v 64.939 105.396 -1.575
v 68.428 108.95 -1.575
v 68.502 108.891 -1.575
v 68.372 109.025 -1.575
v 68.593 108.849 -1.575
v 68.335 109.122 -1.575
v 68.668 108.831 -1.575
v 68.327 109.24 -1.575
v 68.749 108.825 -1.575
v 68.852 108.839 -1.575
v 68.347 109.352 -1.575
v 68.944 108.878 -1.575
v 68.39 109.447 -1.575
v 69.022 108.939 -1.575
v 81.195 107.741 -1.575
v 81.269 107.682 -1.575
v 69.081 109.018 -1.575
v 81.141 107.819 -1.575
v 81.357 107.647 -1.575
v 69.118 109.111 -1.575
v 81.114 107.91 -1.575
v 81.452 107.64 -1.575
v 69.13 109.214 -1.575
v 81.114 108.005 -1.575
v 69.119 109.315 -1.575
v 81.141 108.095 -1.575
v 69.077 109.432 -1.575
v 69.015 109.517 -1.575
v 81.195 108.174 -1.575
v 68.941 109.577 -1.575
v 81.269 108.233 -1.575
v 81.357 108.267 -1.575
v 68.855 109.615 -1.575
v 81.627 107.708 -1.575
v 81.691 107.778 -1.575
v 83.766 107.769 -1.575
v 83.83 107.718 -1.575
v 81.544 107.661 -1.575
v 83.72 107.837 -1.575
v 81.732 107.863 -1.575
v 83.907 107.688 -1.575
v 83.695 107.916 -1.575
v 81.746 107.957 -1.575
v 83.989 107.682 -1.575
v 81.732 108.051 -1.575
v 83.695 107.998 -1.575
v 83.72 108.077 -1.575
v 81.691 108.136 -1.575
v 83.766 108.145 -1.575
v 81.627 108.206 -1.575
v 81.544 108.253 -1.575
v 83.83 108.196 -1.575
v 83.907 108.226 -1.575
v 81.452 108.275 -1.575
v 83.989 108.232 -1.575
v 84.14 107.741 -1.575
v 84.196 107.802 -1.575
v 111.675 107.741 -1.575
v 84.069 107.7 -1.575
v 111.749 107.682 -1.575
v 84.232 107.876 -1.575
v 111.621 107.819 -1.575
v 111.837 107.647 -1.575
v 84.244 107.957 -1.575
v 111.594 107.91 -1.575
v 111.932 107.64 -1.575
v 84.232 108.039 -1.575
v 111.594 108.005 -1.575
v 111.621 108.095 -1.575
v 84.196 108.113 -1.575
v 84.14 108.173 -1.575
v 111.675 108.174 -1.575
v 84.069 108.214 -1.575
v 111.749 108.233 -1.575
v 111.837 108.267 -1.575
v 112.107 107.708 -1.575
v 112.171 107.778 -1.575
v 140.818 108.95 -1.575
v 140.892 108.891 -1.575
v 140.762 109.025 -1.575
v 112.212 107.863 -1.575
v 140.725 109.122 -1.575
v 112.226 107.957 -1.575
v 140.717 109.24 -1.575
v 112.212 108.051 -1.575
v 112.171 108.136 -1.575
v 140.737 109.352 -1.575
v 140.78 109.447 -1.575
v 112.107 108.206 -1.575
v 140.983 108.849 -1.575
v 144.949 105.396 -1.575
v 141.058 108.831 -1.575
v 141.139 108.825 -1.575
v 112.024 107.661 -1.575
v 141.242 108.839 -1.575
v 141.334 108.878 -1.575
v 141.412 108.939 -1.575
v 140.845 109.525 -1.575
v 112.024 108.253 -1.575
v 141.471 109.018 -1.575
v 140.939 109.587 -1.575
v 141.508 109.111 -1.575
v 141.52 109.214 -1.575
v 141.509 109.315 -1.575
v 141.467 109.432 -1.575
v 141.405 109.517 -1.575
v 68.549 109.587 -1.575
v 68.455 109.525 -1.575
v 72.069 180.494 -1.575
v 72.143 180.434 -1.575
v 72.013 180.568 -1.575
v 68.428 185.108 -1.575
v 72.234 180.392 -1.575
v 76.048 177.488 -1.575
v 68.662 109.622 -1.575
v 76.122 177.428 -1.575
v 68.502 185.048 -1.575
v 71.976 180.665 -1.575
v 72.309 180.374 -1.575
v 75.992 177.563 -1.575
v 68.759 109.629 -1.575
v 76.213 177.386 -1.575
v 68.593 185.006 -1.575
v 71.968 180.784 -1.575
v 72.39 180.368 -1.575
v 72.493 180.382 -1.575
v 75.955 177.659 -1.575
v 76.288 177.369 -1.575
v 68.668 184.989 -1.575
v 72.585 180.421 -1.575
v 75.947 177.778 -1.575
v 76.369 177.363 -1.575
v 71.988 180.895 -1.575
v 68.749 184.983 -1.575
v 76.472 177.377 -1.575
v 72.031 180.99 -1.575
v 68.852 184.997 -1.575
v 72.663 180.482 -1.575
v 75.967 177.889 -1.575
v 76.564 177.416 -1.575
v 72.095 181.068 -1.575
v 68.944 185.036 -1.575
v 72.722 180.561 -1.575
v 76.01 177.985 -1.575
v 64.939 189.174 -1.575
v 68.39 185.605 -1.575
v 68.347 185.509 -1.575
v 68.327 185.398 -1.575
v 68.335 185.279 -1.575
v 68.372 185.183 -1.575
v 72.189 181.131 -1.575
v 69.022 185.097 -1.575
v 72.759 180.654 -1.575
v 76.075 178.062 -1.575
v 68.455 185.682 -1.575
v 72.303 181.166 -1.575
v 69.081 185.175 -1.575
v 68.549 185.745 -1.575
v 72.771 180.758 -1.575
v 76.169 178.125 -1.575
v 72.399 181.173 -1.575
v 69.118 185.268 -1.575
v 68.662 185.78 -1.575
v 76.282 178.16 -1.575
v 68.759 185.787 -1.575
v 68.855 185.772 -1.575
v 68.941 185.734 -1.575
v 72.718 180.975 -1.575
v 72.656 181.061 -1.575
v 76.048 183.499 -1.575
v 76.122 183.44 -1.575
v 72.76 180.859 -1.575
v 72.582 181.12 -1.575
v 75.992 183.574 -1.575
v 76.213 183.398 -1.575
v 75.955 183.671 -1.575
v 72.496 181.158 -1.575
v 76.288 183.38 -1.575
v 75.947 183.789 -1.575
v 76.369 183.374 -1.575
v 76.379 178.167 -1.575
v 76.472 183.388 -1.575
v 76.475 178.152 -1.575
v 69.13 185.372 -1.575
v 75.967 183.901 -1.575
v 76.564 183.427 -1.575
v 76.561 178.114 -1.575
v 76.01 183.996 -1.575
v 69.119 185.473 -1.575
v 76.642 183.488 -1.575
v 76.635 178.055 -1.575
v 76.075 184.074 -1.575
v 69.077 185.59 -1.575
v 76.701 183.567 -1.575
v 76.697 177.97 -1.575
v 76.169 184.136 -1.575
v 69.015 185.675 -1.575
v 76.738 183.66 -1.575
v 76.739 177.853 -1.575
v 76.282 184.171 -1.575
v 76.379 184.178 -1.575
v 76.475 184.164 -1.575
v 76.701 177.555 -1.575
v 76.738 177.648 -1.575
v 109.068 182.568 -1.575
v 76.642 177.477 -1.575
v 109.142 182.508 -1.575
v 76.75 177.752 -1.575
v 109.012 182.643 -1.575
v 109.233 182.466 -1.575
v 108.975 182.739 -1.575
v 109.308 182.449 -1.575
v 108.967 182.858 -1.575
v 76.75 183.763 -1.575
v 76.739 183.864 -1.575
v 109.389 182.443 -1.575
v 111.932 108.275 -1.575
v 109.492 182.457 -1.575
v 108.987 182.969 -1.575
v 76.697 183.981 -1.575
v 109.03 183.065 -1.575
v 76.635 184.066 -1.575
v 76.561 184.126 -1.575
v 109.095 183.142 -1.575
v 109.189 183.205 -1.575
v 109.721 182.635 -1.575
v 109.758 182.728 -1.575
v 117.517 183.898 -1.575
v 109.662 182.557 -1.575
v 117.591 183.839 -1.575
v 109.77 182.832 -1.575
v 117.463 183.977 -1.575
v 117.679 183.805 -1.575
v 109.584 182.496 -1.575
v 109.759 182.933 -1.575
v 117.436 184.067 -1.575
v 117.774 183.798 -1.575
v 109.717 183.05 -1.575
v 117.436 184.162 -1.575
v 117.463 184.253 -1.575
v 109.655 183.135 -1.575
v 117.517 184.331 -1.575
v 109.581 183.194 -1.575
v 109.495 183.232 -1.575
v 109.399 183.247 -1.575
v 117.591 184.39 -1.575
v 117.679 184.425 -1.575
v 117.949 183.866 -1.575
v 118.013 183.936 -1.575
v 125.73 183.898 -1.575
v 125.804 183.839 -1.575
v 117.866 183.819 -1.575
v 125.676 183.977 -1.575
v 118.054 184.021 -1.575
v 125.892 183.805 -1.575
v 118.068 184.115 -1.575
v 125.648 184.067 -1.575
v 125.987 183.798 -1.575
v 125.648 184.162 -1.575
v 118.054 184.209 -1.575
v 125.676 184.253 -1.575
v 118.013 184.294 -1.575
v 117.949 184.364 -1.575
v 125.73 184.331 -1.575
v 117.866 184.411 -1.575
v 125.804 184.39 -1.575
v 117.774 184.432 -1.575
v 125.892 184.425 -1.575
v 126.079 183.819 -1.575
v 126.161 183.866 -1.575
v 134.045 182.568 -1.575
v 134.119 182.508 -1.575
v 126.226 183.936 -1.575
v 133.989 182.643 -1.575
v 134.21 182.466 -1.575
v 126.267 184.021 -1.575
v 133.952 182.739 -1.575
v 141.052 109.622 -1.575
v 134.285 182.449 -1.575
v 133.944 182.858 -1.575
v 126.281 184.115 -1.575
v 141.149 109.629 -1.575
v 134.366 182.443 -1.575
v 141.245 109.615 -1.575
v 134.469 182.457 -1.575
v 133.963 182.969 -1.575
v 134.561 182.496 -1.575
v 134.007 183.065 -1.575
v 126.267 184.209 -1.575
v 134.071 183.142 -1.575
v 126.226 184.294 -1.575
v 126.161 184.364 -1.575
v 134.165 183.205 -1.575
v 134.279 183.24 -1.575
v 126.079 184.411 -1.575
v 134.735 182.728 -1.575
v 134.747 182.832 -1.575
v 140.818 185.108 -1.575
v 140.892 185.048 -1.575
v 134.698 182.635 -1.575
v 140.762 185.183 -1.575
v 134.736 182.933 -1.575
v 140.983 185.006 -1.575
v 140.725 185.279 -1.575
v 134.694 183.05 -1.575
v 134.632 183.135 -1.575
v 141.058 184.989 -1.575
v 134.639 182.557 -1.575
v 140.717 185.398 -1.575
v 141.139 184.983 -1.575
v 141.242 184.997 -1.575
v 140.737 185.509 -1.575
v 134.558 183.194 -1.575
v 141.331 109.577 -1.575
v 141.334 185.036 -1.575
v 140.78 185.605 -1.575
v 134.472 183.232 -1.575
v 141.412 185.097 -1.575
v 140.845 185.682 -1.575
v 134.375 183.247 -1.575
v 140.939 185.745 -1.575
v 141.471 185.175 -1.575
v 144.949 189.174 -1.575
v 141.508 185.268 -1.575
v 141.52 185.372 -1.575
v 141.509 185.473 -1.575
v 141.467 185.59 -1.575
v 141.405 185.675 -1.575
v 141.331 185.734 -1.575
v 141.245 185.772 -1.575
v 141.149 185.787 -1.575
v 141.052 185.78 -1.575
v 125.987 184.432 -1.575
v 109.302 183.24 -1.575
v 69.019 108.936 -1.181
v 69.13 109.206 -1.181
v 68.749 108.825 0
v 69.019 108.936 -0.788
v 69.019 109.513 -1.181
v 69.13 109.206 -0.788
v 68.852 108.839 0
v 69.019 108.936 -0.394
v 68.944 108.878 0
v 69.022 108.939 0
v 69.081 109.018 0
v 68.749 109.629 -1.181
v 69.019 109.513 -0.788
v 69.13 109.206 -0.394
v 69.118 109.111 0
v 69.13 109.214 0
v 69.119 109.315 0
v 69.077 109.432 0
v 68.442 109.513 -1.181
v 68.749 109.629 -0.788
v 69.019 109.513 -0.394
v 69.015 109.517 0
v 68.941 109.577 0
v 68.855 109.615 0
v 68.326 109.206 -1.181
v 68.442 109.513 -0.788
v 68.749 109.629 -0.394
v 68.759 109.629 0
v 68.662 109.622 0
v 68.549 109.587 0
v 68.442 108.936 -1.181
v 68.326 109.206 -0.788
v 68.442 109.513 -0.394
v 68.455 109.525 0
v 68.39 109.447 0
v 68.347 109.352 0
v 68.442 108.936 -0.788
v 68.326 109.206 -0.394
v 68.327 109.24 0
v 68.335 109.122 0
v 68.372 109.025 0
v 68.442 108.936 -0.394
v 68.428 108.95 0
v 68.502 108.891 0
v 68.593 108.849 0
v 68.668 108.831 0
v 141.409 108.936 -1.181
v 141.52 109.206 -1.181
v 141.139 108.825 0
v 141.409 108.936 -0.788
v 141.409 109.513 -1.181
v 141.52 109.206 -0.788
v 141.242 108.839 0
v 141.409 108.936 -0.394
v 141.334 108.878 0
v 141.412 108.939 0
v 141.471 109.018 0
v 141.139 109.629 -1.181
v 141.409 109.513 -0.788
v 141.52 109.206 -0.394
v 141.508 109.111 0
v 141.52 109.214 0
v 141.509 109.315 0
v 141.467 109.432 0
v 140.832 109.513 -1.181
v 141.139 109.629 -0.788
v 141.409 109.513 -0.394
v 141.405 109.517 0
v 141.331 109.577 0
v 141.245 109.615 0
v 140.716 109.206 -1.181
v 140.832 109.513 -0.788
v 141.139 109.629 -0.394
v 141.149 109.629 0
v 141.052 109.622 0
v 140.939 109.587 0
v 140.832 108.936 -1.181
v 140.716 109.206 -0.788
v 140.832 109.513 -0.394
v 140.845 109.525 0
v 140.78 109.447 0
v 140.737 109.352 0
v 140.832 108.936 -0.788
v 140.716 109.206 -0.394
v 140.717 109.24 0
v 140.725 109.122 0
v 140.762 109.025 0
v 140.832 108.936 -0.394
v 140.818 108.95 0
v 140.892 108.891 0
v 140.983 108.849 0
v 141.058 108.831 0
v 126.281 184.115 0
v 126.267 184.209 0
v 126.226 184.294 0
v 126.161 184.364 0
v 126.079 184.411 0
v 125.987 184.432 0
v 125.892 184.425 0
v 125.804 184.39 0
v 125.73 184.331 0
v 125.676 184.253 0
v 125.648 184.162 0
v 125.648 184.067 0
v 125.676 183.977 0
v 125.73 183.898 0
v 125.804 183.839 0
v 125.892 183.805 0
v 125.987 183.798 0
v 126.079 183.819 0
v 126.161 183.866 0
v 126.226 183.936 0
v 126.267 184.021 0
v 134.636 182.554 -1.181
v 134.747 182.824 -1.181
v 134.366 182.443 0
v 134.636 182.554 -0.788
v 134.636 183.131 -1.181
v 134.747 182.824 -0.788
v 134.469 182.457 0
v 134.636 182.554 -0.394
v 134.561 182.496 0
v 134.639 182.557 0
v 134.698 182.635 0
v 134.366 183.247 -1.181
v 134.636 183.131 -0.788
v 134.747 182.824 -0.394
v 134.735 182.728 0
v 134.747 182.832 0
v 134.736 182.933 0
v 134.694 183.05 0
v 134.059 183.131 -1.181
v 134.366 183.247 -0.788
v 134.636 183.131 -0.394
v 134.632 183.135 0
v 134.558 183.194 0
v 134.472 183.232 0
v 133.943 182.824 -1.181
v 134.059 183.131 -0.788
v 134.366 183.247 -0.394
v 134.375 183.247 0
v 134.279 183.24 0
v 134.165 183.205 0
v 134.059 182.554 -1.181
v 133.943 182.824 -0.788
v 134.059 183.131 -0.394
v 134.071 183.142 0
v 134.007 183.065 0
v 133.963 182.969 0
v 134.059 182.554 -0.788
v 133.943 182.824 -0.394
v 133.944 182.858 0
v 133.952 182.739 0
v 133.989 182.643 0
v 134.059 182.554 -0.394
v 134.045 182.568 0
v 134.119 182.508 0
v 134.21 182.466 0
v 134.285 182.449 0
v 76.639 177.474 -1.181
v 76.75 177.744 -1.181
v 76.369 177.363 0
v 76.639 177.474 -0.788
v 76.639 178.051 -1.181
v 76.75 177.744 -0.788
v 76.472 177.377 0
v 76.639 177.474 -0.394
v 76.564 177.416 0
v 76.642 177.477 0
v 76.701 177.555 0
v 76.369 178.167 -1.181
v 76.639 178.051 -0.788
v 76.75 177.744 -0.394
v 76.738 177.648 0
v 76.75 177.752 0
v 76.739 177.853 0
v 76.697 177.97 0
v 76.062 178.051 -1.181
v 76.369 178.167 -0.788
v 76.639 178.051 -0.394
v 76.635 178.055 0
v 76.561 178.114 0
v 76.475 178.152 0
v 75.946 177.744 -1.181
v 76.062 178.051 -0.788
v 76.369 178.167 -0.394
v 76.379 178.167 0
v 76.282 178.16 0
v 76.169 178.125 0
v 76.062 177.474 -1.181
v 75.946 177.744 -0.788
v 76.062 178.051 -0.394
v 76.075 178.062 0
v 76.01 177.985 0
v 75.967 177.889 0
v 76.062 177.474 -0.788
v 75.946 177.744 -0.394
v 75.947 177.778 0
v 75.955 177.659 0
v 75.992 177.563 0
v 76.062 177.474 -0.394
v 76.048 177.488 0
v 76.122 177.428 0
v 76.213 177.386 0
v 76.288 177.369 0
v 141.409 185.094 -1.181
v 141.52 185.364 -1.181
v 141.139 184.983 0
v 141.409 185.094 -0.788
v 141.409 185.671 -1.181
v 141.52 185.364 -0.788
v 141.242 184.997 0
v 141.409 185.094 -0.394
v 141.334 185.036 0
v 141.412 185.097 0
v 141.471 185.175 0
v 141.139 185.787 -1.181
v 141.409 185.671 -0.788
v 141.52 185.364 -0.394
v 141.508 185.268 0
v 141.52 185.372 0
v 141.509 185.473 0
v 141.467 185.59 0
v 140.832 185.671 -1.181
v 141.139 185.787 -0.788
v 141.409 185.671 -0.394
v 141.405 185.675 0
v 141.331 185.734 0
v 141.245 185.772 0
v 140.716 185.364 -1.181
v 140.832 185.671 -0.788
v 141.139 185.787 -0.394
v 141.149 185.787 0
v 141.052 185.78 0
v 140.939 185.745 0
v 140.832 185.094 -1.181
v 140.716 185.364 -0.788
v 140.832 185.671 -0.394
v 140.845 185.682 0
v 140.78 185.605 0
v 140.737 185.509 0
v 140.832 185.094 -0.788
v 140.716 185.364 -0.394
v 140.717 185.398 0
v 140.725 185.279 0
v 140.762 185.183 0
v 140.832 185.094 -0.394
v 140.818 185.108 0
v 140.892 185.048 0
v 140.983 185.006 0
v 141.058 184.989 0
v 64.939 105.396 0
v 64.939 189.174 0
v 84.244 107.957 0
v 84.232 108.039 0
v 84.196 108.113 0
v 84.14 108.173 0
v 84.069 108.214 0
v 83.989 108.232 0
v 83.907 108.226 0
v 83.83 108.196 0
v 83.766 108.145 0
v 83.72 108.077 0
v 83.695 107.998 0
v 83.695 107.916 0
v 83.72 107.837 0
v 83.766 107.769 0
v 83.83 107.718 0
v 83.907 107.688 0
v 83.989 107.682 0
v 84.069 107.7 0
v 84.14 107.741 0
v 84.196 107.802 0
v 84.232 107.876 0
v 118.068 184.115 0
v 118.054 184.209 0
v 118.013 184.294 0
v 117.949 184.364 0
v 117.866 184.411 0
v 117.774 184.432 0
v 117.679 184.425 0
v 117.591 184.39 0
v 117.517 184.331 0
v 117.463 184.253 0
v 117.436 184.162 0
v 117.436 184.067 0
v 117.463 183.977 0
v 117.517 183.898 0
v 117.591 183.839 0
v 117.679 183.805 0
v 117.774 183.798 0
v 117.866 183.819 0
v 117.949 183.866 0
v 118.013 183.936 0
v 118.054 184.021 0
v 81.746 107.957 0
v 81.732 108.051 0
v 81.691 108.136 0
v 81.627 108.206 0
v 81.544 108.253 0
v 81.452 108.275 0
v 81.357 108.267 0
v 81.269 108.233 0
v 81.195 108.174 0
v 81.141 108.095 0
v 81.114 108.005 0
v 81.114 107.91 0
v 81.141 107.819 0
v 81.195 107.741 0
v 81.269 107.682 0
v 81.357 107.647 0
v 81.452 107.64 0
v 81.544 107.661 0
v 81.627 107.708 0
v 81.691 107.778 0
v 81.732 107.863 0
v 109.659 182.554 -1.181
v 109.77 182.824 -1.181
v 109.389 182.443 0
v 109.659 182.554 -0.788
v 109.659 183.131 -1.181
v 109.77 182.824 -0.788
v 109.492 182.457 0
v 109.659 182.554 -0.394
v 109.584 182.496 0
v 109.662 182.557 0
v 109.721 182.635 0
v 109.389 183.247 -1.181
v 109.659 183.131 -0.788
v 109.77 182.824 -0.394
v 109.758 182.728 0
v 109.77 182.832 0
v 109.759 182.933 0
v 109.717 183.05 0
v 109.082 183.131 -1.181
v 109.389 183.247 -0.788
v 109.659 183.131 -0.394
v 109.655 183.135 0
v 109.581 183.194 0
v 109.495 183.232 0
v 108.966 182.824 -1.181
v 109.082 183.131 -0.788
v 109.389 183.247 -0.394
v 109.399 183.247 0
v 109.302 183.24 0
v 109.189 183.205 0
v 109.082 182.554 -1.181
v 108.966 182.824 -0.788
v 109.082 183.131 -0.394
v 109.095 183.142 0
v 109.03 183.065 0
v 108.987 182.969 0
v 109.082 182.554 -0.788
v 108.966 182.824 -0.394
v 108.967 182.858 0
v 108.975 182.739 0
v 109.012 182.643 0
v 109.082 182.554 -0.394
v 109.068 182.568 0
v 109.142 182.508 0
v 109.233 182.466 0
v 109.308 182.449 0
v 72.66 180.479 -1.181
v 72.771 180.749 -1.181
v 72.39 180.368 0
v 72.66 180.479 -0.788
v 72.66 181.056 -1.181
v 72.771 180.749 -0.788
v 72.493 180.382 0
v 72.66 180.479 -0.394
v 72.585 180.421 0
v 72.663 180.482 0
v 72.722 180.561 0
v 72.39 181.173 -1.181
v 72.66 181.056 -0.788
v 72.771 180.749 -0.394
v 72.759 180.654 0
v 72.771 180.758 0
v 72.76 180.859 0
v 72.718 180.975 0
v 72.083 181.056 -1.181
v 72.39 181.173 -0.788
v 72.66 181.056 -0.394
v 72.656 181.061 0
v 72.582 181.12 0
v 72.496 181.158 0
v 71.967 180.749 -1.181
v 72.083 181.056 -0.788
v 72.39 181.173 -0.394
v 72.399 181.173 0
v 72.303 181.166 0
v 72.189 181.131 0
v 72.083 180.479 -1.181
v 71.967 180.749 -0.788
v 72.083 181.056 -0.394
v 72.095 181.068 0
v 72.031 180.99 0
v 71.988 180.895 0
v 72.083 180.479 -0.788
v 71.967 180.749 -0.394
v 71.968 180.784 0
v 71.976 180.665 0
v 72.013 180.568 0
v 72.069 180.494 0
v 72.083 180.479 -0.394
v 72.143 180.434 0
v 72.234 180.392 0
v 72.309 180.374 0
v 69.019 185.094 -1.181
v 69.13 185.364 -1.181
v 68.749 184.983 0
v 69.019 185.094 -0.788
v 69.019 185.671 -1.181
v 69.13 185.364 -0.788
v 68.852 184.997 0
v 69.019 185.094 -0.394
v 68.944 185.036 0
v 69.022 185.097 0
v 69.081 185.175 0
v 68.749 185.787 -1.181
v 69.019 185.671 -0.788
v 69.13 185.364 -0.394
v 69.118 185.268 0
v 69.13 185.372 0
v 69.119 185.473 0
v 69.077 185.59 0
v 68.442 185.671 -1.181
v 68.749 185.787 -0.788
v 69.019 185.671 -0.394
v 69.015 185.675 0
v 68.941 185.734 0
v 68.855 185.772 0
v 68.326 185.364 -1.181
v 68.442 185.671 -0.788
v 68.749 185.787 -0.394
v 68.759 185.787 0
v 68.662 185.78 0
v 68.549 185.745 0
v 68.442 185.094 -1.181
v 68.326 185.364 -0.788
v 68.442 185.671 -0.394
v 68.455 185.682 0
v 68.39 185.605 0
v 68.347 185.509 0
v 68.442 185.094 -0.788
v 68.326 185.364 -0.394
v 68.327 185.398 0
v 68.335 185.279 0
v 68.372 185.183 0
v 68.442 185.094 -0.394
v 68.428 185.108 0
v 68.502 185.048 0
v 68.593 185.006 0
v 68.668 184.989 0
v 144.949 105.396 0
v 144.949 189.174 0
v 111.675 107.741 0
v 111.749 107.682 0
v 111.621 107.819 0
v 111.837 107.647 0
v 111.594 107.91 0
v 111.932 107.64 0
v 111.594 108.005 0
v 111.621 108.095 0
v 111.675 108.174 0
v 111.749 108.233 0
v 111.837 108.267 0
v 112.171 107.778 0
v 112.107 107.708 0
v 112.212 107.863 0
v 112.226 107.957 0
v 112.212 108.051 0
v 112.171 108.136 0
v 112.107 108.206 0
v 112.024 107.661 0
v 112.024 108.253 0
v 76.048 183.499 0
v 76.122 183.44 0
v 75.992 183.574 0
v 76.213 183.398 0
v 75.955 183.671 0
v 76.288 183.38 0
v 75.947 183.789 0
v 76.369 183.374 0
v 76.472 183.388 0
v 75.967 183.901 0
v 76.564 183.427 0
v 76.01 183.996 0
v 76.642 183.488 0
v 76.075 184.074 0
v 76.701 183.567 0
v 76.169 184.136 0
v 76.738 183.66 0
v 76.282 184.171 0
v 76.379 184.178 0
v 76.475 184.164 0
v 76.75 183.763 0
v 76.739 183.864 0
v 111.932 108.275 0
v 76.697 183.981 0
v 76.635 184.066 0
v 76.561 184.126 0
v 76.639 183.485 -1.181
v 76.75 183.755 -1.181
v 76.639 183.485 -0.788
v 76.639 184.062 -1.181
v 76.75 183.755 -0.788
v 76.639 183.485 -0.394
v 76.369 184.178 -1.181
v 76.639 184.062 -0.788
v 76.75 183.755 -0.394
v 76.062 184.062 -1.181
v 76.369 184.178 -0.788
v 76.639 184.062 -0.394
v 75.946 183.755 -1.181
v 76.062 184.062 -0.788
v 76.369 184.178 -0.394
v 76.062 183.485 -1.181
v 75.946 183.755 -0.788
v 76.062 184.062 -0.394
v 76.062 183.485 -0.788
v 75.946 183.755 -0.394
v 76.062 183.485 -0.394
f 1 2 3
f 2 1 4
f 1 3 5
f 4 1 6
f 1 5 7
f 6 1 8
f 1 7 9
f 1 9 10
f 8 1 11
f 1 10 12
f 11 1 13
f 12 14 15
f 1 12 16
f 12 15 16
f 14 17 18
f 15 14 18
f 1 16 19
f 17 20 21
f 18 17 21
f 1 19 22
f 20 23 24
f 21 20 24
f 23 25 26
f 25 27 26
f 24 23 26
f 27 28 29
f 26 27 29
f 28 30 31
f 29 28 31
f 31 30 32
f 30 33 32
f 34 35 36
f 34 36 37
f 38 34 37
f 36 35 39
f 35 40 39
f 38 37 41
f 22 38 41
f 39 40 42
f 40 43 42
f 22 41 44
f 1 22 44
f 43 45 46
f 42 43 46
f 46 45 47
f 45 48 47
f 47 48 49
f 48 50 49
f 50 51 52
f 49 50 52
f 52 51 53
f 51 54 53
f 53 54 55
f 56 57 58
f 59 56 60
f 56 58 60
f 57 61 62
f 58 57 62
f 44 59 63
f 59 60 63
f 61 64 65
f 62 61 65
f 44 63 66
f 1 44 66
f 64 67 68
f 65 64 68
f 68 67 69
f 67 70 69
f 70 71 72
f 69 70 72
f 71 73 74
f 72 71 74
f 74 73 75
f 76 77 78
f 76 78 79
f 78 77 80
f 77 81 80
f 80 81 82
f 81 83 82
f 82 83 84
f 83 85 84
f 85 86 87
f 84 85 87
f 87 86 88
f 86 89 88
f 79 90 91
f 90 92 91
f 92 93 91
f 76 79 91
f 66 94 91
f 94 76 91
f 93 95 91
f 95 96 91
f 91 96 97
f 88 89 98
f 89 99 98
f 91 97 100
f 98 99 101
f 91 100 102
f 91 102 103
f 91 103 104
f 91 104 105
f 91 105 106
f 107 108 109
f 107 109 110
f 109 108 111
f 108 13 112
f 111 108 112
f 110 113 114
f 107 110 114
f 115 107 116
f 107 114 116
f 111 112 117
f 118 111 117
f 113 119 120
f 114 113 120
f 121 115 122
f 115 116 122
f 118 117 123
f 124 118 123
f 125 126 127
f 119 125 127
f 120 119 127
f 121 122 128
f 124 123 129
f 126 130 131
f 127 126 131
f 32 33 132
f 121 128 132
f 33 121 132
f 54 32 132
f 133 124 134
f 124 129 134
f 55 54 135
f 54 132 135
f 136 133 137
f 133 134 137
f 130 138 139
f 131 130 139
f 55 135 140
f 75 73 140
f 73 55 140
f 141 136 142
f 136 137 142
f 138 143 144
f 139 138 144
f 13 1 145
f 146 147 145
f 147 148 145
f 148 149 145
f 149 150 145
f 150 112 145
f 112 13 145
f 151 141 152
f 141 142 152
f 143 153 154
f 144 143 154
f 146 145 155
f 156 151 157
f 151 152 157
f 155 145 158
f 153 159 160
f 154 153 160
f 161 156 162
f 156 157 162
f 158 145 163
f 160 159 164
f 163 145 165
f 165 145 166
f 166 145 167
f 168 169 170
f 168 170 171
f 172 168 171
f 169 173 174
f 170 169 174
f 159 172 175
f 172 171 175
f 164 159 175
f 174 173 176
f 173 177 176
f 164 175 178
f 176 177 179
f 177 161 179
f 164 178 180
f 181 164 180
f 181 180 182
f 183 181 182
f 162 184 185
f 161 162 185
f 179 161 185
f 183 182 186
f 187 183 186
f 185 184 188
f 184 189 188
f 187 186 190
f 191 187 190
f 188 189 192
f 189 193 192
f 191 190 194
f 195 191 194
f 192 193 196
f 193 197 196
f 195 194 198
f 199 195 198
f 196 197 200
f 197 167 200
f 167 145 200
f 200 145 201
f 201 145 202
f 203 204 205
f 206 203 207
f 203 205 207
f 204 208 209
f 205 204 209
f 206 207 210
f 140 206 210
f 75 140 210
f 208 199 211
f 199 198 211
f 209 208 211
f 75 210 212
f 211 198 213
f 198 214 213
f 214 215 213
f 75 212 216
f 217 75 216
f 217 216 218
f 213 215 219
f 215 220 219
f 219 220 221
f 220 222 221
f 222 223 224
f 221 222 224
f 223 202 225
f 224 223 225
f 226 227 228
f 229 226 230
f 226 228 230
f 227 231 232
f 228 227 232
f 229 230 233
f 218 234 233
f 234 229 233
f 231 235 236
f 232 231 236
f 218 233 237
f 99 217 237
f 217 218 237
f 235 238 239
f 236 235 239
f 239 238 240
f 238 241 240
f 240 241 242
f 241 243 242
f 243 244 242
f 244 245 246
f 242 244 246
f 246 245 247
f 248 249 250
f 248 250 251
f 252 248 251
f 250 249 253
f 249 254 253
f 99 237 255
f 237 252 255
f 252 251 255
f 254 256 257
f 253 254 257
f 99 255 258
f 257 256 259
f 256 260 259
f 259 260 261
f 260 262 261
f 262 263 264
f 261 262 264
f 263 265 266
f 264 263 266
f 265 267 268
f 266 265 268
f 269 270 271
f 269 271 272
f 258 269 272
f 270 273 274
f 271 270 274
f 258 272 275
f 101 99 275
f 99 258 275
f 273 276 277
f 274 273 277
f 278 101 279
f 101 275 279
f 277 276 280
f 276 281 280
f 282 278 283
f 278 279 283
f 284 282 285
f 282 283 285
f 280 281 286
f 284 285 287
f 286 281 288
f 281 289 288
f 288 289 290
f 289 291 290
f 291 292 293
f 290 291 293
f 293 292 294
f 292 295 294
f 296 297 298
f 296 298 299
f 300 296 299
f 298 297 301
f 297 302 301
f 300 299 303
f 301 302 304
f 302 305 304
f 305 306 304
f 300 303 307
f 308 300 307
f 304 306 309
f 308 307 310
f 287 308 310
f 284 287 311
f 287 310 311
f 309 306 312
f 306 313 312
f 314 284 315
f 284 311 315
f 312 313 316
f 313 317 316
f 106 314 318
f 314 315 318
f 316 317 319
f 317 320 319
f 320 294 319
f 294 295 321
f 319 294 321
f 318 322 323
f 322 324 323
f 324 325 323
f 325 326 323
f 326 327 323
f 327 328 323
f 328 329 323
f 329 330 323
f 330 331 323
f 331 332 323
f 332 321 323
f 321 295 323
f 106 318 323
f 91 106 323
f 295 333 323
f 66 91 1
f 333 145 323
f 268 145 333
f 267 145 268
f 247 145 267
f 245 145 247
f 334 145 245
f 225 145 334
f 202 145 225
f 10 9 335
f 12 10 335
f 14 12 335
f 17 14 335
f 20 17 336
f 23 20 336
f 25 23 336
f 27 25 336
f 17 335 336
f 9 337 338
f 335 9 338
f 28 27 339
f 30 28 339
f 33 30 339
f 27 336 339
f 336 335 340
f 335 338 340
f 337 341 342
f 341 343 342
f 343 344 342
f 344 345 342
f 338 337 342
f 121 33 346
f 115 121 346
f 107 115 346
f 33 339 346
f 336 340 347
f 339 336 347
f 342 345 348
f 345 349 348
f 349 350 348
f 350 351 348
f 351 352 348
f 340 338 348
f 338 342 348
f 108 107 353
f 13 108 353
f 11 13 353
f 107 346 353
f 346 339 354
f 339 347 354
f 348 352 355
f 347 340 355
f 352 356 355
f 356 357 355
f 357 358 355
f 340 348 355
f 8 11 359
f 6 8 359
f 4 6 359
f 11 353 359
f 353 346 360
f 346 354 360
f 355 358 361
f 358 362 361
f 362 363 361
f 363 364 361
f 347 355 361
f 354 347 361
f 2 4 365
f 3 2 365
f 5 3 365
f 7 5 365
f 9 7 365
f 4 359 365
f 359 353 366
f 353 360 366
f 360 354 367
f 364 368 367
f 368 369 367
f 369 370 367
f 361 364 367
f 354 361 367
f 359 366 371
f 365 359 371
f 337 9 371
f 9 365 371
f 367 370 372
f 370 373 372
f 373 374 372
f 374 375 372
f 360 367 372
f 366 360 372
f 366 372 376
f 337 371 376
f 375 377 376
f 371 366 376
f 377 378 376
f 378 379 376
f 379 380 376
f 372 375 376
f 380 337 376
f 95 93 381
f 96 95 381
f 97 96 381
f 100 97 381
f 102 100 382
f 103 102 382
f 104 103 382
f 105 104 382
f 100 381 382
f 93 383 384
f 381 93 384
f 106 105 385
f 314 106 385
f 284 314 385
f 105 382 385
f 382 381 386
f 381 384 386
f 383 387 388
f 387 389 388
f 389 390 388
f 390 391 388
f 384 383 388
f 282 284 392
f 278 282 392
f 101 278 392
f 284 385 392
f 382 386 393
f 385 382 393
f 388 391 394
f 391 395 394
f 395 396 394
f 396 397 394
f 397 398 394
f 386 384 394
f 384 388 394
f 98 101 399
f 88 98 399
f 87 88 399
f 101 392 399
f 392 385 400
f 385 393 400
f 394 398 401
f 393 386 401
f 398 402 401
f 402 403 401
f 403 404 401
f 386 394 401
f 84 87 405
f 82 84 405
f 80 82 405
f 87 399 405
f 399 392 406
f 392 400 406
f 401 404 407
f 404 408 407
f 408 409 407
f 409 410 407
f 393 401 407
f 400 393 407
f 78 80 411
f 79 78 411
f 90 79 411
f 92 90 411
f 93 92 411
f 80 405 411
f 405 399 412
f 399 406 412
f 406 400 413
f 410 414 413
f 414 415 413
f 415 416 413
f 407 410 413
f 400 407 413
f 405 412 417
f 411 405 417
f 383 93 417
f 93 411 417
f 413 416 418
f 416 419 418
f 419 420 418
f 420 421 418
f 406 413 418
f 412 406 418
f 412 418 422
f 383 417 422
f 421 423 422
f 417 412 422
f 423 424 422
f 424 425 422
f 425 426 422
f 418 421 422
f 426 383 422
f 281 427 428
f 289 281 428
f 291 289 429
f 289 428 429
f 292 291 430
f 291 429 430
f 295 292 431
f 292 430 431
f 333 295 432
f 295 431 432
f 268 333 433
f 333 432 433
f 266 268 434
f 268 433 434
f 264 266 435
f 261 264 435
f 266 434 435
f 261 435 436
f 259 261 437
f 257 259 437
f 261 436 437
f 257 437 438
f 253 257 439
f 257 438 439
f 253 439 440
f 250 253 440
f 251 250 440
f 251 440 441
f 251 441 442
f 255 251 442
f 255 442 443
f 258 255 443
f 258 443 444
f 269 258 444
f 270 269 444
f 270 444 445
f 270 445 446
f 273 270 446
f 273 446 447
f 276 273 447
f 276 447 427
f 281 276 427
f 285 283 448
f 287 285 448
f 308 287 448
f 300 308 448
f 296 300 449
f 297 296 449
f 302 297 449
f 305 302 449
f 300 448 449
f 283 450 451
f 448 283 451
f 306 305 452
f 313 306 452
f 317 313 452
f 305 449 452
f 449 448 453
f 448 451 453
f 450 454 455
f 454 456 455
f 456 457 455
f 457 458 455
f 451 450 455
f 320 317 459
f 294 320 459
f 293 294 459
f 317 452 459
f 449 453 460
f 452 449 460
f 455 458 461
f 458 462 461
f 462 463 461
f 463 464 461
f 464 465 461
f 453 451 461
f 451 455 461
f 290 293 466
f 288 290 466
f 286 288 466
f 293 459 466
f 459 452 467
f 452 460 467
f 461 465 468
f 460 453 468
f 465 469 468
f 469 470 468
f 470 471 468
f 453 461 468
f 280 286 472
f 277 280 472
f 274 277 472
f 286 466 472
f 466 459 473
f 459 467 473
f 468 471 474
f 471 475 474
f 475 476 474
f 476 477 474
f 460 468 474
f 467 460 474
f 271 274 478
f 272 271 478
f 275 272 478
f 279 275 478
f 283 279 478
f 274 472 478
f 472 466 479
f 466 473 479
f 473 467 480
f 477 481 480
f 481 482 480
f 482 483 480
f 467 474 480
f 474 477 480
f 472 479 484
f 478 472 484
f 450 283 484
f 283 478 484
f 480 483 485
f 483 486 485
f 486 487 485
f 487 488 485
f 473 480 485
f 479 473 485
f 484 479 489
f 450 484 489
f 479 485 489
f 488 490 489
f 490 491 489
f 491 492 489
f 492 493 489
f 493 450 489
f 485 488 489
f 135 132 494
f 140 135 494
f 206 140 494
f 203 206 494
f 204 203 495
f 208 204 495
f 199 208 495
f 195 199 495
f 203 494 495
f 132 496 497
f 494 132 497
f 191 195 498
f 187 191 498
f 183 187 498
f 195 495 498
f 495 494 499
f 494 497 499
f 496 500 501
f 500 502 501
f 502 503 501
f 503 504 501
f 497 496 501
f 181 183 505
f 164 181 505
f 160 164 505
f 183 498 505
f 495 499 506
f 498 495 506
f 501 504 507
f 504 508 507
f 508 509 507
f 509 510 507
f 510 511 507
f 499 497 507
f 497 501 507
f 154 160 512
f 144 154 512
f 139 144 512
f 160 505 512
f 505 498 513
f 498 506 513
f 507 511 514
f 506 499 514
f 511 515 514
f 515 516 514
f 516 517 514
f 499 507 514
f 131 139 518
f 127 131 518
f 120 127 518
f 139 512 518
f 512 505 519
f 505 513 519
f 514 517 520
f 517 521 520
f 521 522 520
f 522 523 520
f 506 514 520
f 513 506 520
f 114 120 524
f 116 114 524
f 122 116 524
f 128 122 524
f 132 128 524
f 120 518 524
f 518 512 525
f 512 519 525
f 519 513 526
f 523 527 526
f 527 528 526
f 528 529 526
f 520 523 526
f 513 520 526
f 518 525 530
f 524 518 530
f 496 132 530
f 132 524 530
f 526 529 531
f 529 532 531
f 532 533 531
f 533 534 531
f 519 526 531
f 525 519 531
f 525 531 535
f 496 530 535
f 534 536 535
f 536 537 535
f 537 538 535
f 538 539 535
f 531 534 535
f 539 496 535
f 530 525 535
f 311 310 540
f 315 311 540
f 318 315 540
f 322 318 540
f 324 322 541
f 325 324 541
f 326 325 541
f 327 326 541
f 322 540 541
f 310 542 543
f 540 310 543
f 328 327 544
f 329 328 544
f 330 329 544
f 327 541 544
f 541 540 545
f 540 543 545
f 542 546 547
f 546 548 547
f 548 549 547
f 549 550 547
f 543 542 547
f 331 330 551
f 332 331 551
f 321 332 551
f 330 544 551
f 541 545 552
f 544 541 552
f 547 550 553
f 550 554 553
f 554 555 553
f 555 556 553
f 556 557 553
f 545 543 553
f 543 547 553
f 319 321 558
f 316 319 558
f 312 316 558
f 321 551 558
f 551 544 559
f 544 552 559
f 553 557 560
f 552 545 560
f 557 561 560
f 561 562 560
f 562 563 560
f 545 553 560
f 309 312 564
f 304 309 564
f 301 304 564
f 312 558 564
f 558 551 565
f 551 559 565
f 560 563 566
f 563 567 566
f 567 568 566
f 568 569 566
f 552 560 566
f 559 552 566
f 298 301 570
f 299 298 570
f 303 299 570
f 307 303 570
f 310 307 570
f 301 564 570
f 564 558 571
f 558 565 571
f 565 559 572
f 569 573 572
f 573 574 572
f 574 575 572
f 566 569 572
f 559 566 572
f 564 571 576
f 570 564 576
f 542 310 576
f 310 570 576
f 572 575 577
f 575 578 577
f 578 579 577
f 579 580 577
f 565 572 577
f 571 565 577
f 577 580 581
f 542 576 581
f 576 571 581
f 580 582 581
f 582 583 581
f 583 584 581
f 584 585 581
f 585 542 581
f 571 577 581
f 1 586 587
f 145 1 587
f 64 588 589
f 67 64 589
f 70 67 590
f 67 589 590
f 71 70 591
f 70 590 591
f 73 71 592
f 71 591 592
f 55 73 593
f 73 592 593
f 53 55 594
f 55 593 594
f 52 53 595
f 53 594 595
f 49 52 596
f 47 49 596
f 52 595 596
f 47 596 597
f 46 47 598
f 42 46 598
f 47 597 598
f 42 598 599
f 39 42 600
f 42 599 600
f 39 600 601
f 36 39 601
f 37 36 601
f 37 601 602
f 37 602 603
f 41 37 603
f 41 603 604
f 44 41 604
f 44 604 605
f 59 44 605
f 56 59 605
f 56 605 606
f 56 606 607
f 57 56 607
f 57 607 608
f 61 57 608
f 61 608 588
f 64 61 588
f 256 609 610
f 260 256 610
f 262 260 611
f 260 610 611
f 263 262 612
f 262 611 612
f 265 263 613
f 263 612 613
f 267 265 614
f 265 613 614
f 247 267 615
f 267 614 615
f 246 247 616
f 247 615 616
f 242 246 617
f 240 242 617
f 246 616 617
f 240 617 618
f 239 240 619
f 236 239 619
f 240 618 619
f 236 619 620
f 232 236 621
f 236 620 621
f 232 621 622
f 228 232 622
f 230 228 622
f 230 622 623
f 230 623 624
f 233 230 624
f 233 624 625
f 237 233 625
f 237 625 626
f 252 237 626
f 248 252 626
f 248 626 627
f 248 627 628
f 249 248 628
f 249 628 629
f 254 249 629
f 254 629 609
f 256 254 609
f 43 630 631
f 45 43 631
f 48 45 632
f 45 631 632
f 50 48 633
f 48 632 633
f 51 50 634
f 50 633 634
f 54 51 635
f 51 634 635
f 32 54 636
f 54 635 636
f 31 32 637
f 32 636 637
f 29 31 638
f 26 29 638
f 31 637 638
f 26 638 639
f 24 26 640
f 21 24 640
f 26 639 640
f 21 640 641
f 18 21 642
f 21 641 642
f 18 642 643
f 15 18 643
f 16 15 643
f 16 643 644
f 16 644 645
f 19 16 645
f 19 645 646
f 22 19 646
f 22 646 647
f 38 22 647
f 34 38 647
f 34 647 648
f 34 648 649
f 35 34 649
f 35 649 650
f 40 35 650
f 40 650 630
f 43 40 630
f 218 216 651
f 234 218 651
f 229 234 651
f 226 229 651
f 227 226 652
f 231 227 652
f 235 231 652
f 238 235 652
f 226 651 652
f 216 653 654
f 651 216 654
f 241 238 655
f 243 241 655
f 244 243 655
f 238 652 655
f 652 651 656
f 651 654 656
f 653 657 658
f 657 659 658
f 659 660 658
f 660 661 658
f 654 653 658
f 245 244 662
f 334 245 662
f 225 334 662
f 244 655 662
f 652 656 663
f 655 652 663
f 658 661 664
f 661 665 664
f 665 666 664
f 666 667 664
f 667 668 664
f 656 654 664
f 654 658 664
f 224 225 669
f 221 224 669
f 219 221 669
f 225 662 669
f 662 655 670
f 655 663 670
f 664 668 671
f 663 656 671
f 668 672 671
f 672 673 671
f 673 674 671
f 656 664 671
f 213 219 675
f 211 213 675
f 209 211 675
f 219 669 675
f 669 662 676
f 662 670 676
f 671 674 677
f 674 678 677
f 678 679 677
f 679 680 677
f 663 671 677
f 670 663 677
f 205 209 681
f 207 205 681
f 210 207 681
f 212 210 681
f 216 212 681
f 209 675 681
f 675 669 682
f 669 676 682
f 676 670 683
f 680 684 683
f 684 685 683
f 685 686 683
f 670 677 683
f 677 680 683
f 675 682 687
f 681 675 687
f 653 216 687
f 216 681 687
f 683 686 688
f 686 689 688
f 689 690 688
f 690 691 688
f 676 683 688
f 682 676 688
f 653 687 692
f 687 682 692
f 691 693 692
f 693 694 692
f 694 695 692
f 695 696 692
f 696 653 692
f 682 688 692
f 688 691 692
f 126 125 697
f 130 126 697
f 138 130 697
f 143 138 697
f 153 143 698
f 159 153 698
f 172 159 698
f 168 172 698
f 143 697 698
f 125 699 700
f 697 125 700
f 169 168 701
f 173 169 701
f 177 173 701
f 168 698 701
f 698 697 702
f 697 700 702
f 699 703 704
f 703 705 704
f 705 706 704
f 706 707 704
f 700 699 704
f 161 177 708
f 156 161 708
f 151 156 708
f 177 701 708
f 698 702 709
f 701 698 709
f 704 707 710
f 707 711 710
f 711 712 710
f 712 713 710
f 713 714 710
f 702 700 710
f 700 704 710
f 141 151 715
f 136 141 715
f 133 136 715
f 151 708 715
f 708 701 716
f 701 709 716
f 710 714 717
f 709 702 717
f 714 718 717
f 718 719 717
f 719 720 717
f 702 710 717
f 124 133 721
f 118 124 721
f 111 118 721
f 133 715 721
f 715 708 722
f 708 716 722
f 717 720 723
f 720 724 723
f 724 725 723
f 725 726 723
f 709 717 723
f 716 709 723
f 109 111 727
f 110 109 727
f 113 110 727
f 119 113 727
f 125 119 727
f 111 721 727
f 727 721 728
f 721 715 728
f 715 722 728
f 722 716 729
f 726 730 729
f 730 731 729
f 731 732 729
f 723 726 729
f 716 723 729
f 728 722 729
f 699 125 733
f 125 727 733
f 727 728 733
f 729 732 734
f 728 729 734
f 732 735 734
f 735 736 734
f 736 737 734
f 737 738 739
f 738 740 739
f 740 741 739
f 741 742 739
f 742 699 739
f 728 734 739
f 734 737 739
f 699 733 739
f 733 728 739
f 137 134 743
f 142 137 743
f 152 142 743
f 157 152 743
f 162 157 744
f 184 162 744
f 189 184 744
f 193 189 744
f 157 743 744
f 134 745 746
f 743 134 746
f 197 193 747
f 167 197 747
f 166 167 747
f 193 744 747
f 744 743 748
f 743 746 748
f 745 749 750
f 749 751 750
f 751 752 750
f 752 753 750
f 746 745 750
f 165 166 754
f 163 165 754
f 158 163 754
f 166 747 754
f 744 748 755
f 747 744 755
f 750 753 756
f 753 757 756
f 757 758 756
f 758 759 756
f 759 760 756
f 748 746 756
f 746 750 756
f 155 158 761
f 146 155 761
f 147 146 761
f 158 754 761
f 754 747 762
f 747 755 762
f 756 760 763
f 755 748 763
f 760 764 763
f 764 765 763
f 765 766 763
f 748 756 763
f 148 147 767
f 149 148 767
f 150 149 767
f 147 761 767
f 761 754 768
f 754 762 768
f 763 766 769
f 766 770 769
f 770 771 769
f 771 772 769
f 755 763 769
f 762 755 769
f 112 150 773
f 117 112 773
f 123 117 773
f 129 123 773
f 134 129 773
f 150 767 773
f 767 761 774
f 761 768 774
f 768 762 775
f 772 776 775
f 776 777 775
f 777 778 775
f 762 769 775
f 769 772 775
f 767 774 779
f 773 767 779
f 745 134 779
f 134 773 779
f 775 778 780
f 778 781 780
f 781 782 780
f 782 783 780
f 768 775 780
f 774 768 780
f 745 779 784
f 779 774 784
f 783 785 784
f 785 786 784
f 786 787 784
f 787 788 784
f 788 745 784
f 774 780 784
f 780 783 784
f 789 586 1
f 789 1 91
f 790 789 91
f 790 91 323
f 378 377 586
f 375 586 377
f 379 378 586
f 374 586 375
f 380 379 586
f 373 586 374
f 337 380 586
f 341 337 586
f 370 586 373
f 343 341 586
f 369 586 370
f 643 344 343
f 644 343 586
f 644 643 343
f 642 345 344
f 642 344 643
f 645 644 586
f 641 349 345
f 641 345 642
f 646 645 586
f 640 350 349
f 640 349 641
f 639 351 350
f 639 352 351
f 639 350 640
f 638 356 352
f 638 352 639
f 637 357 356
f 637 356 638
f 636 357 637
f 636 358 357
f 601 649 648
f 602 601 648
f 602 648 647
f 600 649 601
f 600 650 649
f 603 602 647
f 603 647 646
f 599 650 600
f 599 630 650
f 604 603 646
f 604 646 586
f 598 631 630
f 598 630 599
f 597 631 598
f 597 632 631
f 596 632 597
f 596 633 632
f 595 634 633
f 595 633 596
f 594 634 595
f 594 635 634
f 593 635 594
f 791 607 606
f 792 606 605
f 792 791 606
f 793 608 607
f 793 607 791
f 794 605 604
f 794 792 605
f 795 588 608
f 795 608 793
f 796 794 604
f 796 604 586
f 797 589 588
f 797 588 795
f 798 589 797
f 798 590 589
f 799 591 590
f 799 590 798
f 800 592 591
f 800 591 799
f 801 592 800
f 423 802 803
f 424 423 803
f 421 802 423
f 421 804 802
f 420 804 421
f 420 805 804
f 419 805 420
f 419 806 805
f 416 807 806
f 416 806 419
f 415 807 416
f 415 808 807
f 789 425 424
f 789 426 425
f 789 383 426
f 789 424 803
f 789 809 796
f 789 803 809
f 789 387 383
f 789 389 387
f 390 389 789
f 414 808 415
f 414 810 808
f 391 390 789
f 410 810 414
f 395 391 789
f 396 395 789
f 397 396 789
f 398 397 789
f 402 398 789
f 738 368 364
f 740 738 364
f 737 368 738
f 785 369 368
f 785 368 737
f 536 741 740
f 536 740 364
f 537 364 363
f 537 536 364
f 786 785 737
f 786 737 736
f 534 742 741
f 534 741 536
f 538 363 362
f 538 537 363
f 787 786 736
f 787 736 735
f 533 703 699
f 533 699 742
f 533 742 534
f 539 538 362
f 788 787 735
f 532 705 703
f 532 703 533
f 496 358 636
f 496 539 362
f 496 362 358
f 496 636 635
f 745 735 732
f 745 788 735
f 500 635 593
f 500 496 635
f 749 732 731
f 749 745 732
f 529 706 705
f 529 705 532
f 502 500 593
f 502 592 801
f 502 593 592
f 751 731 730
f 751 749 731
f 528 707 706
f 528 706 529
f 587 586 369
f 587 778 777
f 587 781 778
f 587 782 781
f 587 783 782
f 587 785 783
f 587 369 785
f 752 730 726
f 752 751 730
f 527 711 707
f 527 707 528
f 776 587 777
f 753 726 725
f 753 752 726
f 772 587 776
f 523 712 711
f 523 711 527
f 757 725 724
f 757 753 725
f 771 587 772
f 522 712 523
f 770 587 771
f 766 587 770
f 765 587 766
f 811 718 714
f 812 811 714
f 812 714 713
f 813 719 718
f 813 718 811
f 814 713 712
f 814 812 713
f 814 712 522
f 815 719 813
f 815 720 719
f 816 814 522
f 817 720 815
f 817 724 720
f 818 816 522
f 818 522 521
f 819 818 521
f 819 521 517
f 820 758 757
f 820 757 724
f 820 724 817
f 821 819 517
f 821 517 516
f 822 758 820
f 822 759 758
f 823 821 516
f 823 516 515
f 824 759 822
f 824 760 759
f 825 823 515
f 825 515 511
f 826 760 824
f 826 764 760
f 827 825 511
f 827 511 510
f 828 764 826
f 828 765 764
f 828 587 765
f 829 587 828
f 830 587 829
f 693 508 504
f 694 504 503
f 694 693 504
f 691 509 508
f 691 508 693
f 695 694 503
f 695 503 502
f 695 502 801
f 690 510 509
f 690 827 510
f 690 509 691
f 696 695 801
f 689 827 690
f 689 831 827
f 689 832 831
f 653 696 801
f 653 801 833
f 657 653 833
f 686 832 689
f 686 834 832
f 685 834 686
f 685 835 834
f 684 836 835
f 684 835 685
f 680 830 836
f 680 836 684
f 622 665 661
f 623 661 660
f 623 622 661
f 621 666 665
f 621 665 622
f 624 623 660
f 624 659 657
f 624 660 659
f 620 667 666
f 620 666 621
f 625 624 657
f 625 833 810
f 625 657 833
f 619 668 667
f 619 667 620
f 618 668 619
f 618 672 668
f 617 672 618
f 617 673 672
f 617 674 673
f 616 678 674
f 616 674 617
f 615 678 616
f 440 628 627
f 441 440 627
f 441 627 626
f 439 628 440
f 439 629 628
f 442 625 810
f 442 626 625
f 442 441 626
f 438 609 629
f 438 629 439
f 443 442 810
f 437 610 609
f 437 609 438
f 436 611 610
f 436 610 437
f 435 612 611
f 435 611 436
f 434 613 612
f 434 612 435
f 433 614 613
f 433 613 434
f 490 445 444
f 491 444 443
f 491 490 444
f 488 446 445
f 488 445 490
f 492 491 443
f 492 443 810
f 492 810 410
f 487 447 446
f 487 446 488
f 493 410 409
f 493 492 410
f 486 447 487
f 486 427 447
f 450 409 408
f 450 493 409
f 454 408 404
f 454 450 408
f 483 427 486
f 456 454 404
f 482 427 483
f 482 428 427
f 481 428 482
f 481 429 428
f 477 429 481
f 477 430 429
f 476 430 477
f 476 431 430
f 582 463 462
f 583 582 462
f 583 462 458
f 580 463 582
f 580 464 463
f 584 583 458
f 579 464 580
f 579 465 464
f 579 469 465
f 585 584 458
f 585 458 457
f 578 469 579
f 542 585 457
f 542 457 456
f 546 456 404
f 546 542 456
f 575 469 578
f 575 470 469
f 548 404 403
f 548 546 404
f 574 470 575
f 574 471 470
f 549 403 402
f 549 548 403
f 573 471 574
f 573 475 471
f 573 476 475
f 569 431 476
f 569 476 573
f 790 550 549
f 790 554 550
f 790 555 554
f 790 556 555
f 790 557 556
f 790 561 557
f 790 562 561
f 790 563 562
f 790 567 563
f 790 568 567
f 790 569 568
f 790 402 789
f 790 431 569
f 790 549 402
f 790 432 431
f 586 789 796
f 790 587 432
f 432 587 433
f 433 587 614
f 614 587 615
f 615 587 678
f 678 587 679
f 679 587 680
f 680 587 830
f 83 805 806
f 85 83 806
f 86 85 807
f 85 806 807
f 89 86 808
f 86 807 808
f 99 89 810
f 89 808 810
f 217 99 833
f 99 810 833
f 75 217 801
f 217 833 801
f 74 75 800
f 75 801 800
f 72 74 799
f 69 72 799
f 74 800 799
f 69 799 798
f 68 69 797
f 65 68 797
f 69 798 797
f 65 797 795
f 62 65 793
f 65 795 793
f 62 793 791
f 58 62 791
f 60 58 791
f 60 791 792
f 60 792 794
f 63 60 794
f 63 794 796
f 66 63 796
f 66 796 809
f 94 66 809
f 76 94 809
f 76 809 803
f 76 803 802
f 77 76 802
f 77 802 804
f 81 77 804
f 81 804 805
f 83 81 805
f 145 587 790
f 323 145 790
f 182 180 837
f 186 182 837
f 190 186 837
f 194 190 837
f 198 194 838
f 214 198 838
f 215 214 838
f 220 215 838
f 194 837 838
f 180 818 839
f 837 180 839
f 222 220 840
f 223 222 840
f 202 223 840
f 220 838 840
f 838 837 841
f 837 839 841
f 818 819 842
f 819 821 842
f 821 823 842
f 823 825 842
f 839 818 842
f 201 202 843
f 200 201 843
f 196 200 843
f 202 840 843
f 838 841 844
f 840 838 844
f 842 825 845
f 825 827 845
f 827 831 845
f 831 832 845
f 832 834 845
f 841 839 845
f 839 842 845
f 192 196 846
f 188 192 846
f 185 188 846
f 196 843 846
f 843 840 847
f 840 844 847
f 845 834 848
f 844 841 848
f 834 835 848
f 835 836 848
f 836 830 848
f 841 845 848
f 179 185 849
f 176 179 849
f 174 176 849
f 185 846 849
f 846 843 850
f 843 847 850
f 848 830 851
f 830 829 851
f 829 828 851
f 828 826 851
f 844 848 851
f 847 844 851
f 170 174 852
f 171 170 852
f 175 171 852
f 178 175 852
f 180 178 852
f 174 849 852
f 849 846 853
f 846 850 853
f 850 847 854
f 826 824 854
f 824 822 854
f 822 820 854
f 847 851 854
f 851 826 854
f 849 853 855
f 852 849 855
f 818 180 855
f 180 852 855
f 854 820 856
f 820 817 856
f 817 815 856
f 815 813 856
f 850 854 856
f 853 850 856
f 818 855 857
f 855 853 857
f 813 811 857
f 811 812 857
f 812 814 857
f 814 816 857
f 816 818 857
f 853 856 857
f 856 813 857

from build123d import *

# Parameters (mm, degrees)
MODEL_W             = 80.01
MODEL_H             = 83.777667
BOSS_EXTRUDE1_DEPTH = 1.575
MODEL_6_R           = 0.318204791
CUT_EXTRUDE4_DEPTH  = 10
MODEL_8_R           = 0.318204729
CUT_EXTRUDE5_DEPTH  = 239.326409502
MODEL_9_R           = 0.27597939
CUT_EXTRUDE6_DEPTH  = 239.326409502
MODEL_10_R          = 0.3182048
CUT_EXTRUDE7_DEPTH  = 239.326409502
MODEL_12_R          = 0.3182048
CUT_EXTRUDE10_DEPTH = 239.326409502


with BuildPart() as part:
    # Model → Boss-Extrude1 (new body)
    with BuildSketch(Plane.XY):
        with Locations((104.944333, 147.2848635)):
            Rectangle(MODEL_W, MODEL_H)
        with BuildLine():
            add(Edge.make_bspline(
                [(76.750333, 177.743697), (76.750333, 177.997697), (76.581, 178.16703), (76.369333, 178.16703)],
                knots=[0, 0, 0, 0, 1, 1, 1, 1], degree=3))
            add(Edge.make_bspline(
                [(76.369333, 178.16703), (76.115333, 178.16703), (75.946, 177.997697), (75.946, 177.743697)],
                knots=[0, 0, 0, 0, 1, 1, 1, 1], degree=3))
            add(Edge.make_bspline(
                [(75.946, 177.743697), (75.946, 177.53203), (76.115333, 177.362697), (76.369333, 177.362697)],
                knots=[0, 0, 0, 0, 1, 1, 1, 1], degree=3))
            add(Edge.make_bspline(
                [(76.369333, 177.362697), (76.581, 177.362697), (76.750333, 177.53203), (76.750333, 177.743697)],
                knots=[0, 0, 0, 0, 1, 1, 1, 1], degree=3))
        make_face(mode=Mode.SUBTRACT)
        with BuildLine():
            add(Edge.make_bspline(
                [(76.750333, 183.75503), (76.750333, 184.00903), (76.581, 184.178363), (76.369333, 184.178363)],
                knots=[0, 0, 0, 0, 1, 1, 1, 1], degree=3))
            add(Edge.make_bspline(
                [(76.369333, 184.178363), (76.115333, 184.178363), (75.946, 184.00903), (75.946, 183.75503)],
                knots=[0, 0, 0, 0, 1, 1, 1, 1], degree=3))
            add(Edge.make_bspline(
                [(75.946, 183.75503), (75.946, 183.543363), (76.115333, 183.37403), (76.369333, 183.37403)],
                knots=[0, 0, 0, 0, 1, 1, 1, 1], degree=3))
            add(Edge.make_bspline(
                [(76.369333, 183.37403), (76.581, 183.37403), (76.750333, 183.543363), (76.750333, 183.75503)],
                knots=[0, 0, 0, 0, 1, 1, 1, 1], degree=3))
        make_face(mode=Mode.SUBTRACT)
        with BuildLine():
            add(Edge.make_bspline(
                [(72.771, 180.749363), (72.771, 181.003363), (72.601667, 181.172697), (72.39, 181.172697)],
                knots=[0, 0, 0, 0, 1, 1, 1, 1], degree=3))
            add(Edge.make_bspline(
                [(72.39, 181.172697), (72.136, 181.172697), (71.966667, 181.003363), (71.966667, 180.749363)],
                knots=[0, 0, 0, 0, 1, 1, 1, 1], degree=3))
            add(Edge.make_bspline(
                [(71.966667, 180.749363), (71.966667, 180.537697), (72.136, 180.368363), (72.39, 180.368363)],
                knots=[0, 0, 0, 0, 1, 1, 1, 1], degree=3))
            add(Edge.make_bspline(
                [(72.39, 180.368363), (72.601667, 180.368363), (72.771, 180.537697), (72.771, 180.749363)],
                knots=[0, 0, 0, 0, 1, 1, 1, 1], degree=3))
        make_face(mode=Mode.SUBTRACT)
        with BuildLine():
            add(Edge.make_bspline(
                [(109.770333, 182.823697), (109.770333, 183.077697), (109.601, 183.24703), (109.389333, 183.24703)],
                knots=[0, 0, 0, 0, 1, 1, 1, 1], degree=3))
            add(Edge.make_bspline(
                [(109.389333, 183.24703), (109.135333, 183.24703), (108.966, 183.077697), (108.966, 182.823697)],
                knots=[0, 0, 0, 0, 1, 1, 1, 1], degree=3))
            add(Edge.make_bspline(
                [(108.966, 182.823697), (108.966, 182.61203), (109.135333, 182.442697), (109.389333, 182.442697)],
                knots=[0, 0, 0, 0, 1, 1, 1, 1], degree=3))
            add(Edge.make_bspline(
                [(109.389333, 182.442697), (109.601, 182.442697), (109.770333, 182.61203), (109.770333, 182.823697)],
                knots=[0, 0, 0, 0, 1, 1, 1, 1], degree=3))
        make_face(mode=Mode.SUBTRACT)
        with BuildLine():
            add(Edge.make_bspline(
                [(134.747, 182.823697), (134.747, 183.077697), (134.577667, 183.24703), (134.366, 183.24703)],
                knots=[0, 0, 0, 0, 1, 1, 1, 1], degree=3))
            add(Edge.make_bspline(
                [(134.366, 183.24703), (134.112, 183.24703), (133.942667, 183.077697), (133.942667, 182.823697)],
                knots=[0, 0, 0, 0, 1, 1, 1, 1], degree=3))
            add(Edge.make_bspline(
                [(133.942667, 182.823697), (133.942667, 182.61203), (134.112, 182.442697), (134.366, 182.442697)],
                knots=[0, 0, 0, 0, 1, 1, 1, 1], degree=3))
            add(Edge.make_bspline(
                [(134.366, 182.442697), (134.577667, 182.442697), (134.747, 182.61203), (134.747, 182.823697)],
                knots=[0, 0, 0, 0, 1, 1, 1, 1], degree=3))
        make_face(mode=Mode.SUBTRACT)
        with BuildLine():
            add(Edge.make_bspline(
                [(141.520333, 109.20603), (141.520333, 109.46003), (141.351, 109.629363), (141.139333, 109.629363)],
                knots=[0, 0, 0, 0, 1, 1, 1, 1], degree=3))
            add(Edge.make_bspline(
                [(141.139333, 109.629363), (140.885333, 109.629363), (140.716, 109.46003), (140.716, 109.20603)],
                knots=[0, 0, 0, 0, 1, 1, 1, 1], degree=3))
            add(Edge.make_bspline(
                [(140.716, 109.20603), (140.716, 108.994363), (140.885333, 108.82503), (141.139333, 108.82503)],
                knots=[0, 0, 0, 0, 1, 1, 1, 1], degree=3))
            add(Edge.make_bspline(
                [(141.139333, 108.82503), (141.351, 108.82503), (141.520333, 108.994363), (141.520333, 109.20603)],
                knots=[0, 0, 0, 0, 1, 1, 1, 1], degree=3))
        make_face(mode=Mode.SUBTRACT)
        with BuildLine():
            add(Edge.make_bspline(
                [(141.520333, 185.363697), (141.520333, 185.617697), (141.351, 185.78703), (141.139333, 185.78703)],
                knots=[0, 0, 0, 0, 1, 1, 1, 1], degree=3))
            add(Edge.make_bspline(
                [(141.139333, 185.78703), (140.885333, 185.78703), (140.716, 185.617697), (140.716, 185.363697)],
                knots=[0, 0, 0, 0, 1, 1, 1, 1], degree=3))
            add(Edge.make_bspline(
                [(140.716, 185.363697), (140.716, 185.15203), (140.885333, 184.982697), (141.139333, 184.982697)],
                knots=[0, 0, 0, 0, 1, 1, 1, 1], degree=3))
            add(Edge.make_bspline(
                [(141.139333, 184.982697), (141.351, 184.982697), (141.520333, 185.15203), (141.520333, 185.363697)],
                knots=[0, 0, 0, 0, 1, 1, 1, 1], degree=3))
        make_face(mode=Mode.SUBTRACT)
        with BuildLine():
            add(Edge.make_bspline(
                [(69.130333, 185.363697), (69.130333, 185.617697), (68.961, 185.78703), (68.749333, 185.78703)],
                knots=[0, 0, 0, 0, 1, 1, 1, 1], degree=3))
            add(Edge.make_bspline(
                [(68.749333, 185.78703), (68.495333, 185.78703), (68.326, 185.617697), (68.326, 185.363697)],
                knots=[0, 0, 0, 0, 1, 1, 1, 1], degree=3))
            add(Edge.make_bspline(
                [(68.326, 185.363697), (68.326, 185.15203), (68.495333, 184.982697), (68.749333, 184.982697)],
                knots=[0, 0, 0, 0, 1, 1, 1, 1], degree=3))
            add(Edge.make_bspline(
                [(68.749333, 184.982697), (68.961, 184.982697), (69.130333, 185.15203), (69.130333, 185.363697)],
                knots=[0, 0, 0, 0, 1, 1, 1, 1], degree=3))
        make_face(mode=Mode.SUBTRACT)
        with BuildLine():
            add(Edge.make_bspline(
                [(69.130333, 109.20603), (69.130333, 109.46003), (68.961, 109.629363), (68.749333, 109.629363)],
                knots=[0, 0, 0, 0, 1, 1, 1, 1], degree=3))
            add(Edge.make_bspline(
                [(68.749333, 109.629363), (68.495333, 109.629363), (68.326, 109.46003), (68.326, 109.20603)],
                knots=[0, 0, 0, 0, 1, 1, 1, 1], degree=3))
            add(Edge.make_bspline(
                [(68.326, 109.20603), (68.326, 108.994363), (68.495333, 108.82503), (68.749333, 108.82503)],
                knots=[0, 0, 0, 0, 1, 1, 1, 1], degree=3))
            add(Edge.make_bspline(
                [(68.749333, 108.82503), (68.961, 108.82503), (69.130333, 108.994363), (69.130333, 109.20603)],
                knots=[0, 0, 0, 0, 1, 1, 1, 1], degree=3))
        make_face(mode=Mode.SUBTRACT)
    extrude(amount=-BOSS_EXTRUDE1_DEPTH)

    # Model_6 → Cut-Extrude4 (cut)
    with BuildSketch(Plane.XY):
        with Locations((125.962833062, 184.114863)):
            Circle(MODEL_6_R)
    extrude(amount=-CUT_EXTRUDE4_DEPTH, mode=Mode.SUBTRACT)

    # Model_8 → Cut-Extrude5 (cut, through all)
    with BuildSketch(Plane.XY):
        with Locations((117.750167, 184.114863)):
            Circle(MODEL_8_R)
    extrude(amount=-CUT_EXTRUDE5_DEPTH, mode=Mode.SUBTRACT)

    # Model_9 → Cut-Extrude6 (cut, through all)
    with BuildSketch(Plane.XY):
        with Locations((83.9681665, 107.9571965)):
            Circle(MODEL_9_R)
    extrude(amount=-CUT_EXTRUDE6_DEPTH, mode=Mode.SUBTRACT)

    # Model_10 → Cut-Extrude7 (cut, through all)
    with BuildSketch(Plane.XY):
        with Locations((111.908167, 107.957197071)):
            Circle(MODEL_10_R)
    extrude(amount=-CUT_EXTRUDE7_DEPTH, mode=Mode.SUBTRACT)

    # Model_12 → Cut-Extrude10 (cut, through all)
    with BuildSketch(Plane.XY):
        with Locations((81.428167, 107.957197071)):
            Circle(MODEL_12_R)
    extrude(amount=-CUT_EXTRUDE10_DEPTH, mode=Mode.SUBTRACT)


solid = part.part
